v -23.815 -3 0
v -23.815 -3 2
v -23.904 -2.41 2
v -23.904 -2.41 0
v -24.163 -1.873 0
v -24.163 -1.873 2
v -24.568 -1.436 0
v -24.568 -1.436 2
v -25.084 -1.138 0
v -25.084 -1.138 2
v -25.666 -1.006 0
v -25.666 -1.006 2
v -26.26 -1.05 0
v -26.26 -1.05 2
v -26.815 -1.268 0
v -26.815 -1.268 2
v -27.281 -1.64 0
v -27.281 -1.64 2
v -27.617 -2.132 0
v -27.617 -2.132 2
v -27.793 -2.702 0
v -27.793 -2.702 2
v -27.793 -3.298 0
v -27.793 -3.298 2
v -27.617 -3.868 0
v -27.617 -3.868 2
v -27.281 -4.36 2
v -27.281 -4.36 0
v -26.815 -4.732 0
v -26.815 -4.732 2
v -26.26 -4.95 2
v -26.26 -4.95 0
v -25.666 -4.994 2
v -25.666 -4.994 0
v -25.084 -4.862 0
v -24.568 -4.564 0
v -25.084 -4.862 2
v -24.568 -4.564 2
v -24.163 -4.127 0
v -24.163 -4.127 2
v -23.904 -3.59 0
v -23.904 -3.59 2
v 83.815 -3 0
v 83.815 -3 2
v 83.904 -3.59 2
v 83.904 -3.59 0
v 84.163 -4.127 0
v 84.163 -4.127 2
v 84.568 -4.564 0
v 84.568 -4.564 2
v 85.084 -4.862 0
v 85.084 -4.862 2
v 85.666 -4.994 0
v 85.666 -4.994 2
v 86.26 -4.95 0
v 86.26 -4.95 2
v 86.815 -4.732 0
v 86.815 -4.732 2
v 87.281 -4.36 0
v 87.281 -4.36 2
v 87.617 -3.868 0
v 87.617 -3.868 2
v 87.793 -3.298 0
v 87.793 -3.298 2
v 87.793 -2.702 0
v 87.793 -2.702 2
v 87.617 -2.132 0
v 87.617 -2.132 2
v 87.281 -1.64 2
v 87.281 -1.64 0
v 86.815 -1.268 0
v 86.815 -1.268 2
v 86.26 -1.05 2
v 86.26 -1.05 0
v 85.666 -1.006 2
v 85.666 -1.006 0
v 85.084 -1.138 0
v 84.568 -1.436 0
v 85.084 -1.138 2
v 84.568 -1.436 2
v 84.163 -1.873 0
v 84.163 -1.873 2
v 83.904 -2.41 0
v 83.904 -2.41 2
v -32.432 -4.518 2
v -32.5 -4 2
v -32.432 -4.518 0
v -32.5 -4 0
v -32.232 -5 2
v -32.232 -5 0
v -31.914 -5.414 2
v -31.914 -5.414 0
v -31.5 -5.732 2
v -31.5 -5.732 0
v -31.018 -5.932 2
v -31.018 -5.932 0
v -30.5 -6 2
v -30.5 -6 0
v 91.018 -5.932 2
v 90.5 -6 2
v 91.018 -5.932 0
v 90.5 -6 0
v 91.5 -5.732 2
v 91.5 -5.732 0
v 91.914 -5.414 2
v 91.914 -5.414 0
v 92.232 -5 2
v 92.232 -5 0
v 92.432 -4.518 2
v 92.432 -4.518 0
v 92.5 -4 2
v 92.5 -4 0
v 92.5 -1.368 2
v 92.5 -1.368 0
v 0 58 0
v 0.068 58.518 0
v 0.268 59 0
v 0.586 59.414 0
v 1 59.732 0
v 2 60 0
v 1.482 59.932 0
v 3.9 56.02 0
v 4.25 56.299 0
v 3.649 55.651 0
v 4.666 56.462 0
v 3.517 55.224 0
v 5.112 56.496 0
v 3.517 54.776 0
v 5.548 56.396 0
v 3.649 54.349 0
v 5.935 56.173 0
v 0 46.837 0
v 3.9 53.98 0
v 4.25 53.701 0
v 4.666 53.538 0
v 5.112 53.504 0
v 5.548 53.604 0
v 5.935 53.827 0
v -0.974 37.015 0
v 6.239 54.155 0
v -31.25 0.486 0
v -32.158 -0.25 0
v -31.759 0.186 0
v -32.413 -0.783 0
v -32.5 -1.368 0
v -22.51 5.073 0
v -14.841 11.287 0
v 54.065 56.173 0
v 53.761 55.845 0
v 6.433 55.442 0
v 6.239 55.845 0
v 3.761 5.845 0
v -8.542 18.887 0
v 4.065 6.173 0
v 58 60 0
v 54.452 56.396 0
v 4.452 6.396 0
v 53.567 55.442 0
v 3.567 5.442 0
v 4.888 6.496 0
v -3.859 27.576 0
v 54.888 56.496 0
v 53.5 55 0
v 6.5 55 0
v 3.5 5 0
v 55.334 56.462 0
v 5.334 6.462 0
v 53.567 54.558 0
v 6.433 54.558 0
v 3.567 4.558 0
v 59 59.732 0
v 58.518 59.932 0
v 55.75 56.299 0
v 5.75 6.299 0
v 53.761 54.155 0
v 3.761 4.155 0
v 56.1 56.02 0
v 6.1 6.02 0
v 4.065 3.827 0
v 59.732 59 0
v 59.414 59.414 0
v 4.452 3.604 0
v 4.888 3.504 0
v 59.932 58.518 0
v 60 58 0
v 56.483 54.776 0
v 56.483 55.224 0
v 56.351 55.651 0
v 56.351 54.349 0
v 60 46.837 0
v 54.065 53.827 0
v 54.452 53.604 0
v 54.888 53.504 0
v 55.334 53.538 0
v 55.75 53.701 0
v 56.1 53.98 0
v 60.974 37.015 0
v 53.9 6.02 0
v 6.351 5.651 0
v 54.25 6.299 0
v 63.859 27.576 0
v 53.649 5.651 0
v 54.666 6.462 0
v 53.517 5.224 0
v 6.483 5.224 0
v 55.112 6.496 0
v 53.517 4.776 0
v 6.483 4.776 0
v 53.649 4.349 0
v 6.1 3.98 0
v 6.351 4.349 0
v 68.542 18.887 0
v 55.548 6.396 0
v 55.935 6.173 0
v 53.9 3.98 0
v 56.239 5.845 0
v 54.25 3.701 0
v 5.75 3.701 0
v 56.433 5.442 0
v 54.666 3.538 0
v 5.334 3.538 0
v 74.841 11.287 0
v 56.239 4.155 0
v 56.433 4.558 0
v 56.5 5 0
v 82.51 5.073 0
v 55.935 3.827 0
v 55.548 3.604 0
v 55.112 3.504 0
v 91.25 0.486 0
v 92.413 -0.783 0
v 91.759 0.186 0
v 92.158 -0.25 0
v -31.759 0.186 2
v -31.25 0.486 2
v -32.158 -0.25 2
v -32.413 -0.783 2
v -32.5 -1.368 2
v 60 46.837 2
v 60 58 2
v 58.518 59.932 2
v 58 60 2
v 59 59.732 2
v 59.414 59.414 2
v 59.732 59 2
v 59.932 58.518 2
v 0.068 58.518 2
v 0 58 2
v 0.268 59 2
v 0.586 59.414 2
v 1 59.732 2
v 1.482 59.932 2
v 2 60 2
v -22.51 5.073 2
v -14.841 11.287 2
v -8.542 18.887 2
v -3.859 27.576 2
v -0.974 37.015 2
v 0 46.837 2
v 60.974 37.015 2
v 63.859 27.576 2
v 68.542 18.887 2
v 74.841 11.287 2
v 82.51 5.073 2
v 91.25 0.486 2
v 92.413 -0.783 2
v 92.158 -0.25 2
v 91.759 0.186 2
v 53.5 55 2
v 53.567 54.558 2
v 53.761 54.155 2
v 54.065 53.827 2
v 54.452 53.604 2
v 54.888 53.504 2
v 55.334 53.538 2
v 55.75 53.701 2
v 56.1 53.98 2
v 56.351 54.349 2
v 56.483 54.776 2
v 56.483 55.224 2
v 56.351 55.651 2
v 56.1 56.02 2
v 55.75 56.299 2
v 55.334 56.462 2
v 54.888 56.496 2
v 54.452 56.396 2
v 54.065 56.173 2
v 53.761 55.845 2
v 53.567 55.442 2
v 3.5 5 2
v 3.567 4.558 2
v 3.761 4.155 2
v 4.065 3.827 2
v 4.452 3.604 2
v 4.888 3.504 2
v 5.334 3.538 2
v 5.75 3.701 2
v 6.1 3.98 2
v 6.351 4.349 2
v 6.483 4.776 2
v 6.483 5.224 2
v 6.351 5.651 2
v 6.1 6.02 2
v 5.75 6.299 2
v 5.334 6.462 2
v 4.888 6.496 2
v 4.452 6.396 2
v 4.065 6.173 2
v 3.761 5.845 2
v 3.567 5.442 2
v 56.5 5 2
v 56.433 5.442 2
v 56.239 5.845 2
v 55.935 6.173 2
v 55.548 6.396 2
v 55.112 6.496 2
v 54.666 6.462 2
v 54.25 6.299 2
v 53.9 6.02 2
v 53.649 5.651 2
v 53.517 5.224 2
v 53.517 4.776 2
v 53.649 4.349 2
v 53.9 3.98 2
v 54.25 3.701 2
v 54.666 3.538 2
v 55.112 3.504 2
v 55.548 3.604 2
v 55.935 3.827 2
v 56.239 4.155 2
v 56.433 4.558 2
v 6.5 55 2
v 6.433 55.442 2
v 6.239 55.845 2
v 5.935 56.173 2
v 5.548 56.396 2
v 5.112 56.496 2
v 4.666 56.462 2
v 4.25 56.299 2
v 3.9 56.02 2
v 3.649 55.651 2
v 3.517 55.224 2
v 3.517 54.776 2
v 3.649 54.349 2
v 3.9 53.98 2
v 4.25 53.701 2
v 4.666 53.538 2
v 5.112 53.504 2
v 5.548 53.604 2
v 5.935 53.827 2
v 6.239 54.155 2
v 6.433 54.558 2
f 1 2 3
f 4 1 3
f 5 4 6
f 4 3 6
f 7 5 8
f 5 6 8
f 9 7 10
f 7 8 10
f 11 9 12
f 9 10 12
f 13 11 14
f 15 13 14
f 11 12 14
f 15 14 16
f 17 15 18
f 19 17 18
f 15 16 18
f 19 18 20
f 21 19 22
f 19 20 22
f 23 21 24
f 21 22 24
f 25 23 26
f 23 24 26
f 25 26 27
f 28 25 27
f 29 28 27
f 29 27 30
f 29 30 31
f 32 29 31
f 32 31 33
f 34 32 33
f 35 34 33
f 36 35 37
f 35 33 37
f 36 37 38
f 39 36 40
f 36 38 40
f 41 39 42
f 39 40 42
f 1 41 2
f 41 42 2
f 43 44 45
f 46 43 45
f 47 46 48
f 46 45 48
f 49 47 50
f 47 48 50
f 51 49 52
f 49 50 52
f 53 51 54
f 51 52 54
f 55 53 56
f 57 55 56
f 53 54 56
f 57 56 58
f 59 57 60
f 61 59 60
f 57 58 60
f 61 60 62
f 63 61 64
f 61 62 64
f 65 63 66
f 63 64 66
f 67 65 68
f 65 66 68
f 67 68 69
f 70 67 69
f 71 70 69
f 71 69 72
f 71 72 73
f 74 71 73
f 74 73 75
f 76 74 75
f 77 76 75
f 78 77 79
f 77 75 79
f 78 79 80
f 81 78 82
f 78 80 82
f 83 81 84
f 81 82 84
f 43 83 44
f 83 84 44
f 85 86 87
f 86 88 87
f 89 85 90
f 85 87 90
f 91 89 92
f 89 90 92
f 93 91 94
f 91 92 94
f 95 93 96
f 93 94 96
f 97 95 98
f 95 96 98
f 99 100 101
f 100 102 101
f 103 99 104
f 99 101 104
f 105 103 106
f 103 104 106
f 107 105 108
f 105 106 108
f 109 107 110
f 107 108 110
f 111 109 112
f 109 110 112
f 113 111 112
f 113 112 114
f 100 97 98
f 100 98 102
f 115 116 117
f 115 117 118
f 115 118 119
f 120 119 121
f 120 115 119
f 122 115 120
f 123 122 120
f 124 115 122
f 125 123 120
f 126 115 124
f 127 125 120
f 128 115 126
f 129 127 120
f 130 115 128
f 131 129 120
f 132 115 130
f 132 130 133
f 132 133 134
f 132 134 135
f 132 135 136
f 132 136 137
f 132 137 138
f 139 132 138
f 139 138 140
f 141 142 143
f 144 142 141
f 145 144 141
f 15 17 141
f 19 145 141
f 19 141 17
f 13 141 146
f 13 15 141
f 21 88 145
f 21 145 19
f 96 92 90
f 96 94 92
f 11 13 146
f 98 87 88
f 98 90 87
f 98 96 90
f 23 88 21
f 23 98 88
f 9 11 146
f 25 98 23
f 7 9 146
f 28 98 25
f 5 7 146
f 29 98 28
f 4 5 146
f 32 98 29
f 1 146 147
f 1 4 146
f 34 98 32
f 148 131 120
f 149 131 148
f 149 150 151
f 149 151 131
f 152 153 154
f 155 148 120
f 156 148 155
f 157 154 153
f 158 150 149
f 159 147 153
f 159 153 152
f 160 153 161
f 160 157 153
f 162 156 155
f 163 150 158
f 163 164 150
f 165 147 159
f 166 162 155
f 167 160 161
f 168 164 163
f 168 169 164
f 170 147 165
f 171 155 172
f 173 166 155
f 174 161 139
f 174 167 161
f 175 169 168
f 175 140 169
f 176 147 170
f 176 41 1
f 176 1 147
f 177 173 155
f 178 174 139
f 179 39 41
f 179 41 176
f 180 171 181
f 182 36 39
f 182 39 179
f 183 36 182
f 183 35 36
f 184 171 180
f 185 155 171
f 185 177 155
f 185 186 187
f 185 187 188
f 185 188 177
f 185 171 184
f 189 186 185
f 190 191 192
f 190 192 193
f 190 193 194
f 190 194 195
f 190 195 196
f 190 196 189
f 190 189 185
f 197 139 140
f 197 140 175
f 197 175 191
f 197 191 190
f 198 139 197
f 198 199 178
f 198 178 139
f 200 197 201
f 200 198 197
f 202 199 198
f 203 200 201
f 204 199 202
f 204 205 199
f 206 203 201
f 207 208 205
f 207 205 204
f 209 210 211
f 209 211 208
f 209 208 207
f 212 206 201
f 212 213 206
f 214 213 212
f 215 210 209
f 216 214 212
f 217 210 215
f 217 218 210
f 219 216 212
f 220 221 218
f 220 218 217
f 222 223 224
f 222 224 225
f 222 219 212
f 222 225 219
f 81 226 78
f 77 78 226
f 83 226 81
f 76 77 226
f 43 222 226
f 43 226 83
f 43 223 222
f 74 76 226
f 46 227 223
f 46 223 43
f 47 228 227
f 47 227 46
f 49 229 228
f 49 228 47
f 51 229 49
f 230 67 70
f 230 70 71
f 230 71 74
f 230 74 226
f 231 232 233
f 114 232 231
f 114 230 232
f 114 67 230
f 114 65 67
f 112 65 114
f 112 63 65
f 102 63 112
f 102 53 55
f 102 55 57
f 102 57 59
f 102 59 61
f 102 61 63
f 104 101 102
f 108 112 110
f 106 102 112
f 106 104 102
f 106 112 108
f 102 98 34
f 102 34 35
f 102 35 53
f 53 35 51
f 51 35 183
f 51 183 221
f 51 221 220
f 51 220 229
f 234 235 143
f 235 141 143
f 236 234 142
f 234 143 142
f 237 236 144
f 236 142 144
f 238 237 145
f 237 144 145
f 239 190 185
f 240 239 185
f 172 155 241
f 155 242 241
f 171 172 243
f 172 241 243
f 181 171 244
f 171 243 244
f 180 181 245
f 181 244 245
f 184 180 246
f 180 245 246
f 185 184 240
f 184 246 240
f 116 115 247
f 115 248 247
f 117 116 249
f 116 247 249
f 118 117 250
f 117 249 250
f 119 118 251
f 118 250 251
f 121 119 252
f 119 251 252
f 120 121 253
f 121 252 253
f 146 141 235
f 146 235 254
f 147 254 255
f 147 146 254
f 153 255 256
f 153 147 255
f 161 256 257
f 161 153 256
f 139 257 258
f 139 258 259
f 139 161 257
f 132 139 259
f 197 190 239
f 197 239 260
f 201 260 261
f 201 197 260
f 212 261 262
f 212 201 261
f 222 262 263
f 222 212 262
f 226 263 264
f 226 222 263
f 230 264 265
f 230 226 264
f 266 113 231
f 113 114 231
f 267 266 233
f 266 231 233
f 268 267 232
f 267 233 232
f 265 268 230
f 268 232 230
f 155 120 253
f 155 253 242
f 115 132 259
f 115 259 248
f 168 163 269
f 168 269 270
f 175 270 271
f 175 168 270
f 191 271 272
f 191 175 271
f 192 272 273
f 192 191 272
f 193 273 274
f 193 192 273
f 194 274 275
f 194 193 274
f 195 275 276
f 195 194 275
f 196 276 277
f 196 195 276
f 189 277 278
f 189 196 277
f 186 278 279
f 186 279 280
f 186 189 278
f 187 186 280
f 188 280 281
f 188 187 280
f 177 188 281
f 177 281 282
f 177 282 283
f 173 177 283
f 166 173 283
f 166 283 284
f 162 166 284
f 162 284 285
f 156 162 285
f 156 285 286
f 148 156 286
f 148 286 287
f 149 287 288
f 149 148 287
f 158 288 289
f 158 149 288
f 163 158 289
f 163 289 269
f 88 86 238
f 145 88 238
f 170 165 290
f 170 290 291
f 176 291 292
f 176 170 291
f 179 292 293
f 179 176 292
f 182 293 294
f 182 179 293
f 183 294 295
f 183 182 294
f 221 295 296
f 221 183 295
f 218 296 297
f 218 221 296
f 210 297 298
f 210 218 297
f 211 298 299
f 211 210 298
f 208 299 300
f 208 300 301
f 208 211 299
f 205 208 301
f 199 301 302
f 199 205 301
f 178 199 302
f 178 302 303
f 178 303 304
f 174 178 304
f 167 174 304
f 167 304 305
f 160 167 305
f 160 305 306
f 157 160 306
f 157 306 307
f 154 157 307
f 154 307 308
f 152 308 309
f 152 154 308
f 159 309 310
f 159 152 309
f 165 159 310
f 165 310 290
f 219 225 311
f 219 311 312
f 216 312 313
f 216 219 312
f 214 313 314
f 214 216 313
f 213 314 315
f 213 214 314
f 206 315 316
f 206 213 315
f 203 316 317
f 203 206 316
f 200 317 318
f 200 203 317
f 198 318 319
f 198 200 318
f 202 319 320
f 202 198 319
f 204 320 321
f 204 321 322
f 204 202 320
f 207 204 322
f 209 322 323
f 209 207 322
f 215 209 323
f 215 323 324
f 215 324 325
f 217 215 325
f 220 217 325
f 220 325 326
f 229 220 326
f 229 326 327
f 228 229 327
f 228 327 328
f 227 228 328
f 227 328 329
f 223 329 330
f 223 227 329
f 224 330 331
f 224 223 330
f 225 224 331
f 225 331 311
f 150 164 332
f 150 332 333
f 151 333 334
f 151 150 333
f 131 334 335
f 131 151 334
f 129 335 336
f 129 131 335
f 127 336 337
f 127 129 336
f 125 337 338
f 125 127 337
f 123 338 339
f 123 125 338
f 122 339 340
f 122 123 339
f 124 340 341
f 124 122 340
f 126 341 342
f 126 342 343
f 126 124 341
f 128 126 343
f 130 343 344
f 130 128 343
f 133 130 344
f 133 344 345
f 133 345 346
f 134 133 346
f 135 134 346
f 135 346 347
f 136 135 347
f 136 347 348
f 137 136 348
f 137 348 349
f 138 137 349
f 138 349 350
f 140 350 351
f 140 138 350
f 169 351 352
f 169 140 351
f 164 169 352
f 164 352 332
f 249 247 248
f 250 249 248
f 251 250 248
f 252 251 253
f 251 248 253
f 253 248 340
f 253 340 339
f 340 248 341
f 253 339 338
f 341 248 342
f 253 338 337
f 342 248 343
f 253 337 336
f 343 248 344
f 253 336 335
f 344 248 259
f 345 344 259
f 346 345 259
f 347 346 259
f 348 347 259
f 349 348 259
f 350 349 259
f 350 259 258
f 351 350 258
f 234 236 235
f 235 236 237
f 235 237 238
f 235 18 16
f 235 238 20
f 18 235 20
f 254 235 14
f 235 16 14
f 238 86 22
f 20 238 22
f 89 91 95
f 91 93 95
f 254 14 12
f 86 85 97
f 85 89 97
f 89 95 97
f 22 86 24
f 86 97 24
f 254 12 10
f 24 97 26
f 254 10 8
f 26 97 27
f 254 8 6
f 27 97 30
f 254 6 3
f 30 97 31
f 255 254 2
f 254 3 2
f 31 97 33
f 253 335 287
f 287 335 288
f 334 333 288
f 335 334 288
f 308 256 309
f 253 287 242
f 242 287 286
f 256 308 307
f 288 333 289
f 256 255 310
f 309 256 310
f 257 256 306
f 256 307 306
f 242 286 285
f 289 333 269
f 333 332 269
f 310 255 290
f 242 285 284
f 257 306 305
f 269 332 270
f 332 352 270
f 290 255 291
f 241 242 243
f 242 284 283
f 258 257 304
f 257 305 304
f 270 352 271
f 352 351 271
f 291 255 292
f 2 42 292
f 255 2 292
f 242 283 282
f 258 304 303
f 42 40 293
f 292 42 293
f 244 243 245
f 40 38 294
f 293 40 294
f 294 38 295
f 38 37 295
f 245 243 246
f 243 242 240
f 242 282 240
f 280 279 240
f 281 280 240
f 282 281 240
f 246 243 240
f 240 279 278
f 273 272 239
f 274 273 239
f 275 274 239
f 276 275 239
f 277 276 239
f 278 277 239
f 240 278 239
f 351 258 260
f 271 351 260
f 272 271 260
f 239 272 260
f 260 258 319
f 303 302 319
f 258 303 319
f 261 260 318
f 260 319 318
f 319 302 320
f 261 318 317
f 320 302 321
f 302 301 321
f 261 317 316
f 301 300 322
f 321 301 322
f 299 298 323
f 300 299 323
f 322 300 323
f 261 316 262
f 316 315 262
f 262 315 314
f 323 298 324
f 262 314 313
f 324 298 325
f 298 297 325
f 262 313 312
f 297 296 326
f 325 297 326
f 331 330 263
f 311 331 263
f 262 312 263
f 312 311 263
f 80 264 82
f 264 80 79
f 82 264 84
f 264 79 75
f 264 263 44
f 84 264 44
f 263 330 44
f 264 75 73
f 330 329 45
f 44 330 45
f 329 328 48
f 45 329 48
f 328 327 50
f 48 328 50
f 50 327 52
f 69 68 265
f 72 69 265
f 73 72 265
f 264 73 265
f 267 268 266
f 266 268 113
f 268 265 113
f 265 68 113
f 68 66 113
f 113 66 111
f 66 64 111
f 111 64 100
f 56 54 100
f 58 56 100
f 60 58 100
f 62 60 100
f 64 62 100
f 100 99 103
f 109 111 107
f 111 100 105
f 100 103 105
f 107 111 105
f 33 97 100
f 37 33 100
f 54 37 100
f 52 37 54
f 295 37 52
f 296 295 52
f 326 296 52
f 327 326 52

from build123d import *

# Parameters (mm, degrees)
SKETCH_1_W      = 60
SKETCH_1_H      = 60
SKETCH_1_R      = 1.5
EXTRUDE_1_DEPTH = 2
SKETCH_2_W      = 125
SKETCH_2_H      = 6
SKETCH_2_R      = 2
EXTRUDE_2_DEPTH = 2
FILLET_1_R      = 50
FILLET_2_R      = 2


with BuildPart() as part:
    # 草图1 → 凸台-拉伸1 (new body)
    with BuildSketch(Plane.XY):
        with Locations((30, 30)):
            Rectangle(SKETCH_1_W, SKETCH_1_H)
        with Locations((5, 55)):
            Circle(SKETCH_1_R, mode=Mode.SUBTRACT)
        with Locations(Location((55, 55, 0), (0, 0, 180))):
            Circle(SKETCH_1_R, mode=Mode.SUBTRACT)
        with Locations((55, 5)):
            Circle(SKETCH_1_R, mode=Mode.SUBTRACT)
        with Locations(Location((5, 5, 0), (0, 0, 180))):
            Circle(SKETCH_1_R, mode=Mode.SUBTRACT)
    extrude(amount=EXTRUDE_1_DEPTH)

    # 草图2 → 凸台-拉伸2 (add)
    with BuildSketch(Plane.XY.offset(2)):
        with Locations((30, -3)):
            Rectangle(SKETCH_2_W, SKETCH_2_H)
        with Locations((-25.815, -3)):
            Circle(SKETCH_2_R, mode=Mode.SUBTRACT)
        with Locations(Location((85.815, -3, 0), (0, 0, 180))):
            Circle(SKETCH_2_R, mode=Mode.SUBTRACT)
    extrude(amount=-EXTRUDE_2_DEPTH)

    # 圆角1
    # the kernel refuses this fillet: 50 mm, written as the material it adds along each edge
    with BuildSketch(Plane(origin=(60, 0, 0), x_dir=(1, 0, 0), z_dir=(0, 0, 1))) as fillet_1_piece_1:
        with BuildLine():
            CenterArc((50, 46.837484988), FILLET_1_R, 180, 69.512684885)
            Line((0, 46.837484988), (-1, 46.837484988))
            Line((-1, 46.837484988), (-1, 0))
            Line((-1, 0), (0, -1))
            ThreePointArc((0, -1), (16.25, -1), (32.15, -0.9367497))
            Line((32.15, -0.9367497), (32.5, 0))
        make_face()
    extrude(amount=2)
    with BuildSketch(Plane(origin=(0, 0, 0), x_dir=(-1, 0, 0), z_dir=(0, 0, 1))) as fillet_1_piece_2:
        with BuildLine():
            CenterArc((50, -46.837484988), FILLET_1_R, 110.487315115, 69.512684885)
            Line((0, -46.837484988), (-1, -46.837484988))
            Line((-1, -46.837484988), (-1, 0))
            Line((-1, 0), (0, 1))
            ThreePointArc((0, 1), (16.25, 1), (32.15, 0.9367497))
            Line((32.15, 0.9367497), (32.5, 0))
        make_face()
    extrude(amount=2)

    # 圆角2
    fillet_2_edges = [part.edges().sort_by_distance(p)[0] for p in [
        (-32.5, -6, 1),
        (-32.5, 0, 1),
        (92.5, 0, 1),
        (92.5, -6, 1),
        (0, 60, 1),
        (60, 60, 1),
    ]]
    fillet(fillet_2_edges, radius=FILLET_2_R)


solid = part.part
